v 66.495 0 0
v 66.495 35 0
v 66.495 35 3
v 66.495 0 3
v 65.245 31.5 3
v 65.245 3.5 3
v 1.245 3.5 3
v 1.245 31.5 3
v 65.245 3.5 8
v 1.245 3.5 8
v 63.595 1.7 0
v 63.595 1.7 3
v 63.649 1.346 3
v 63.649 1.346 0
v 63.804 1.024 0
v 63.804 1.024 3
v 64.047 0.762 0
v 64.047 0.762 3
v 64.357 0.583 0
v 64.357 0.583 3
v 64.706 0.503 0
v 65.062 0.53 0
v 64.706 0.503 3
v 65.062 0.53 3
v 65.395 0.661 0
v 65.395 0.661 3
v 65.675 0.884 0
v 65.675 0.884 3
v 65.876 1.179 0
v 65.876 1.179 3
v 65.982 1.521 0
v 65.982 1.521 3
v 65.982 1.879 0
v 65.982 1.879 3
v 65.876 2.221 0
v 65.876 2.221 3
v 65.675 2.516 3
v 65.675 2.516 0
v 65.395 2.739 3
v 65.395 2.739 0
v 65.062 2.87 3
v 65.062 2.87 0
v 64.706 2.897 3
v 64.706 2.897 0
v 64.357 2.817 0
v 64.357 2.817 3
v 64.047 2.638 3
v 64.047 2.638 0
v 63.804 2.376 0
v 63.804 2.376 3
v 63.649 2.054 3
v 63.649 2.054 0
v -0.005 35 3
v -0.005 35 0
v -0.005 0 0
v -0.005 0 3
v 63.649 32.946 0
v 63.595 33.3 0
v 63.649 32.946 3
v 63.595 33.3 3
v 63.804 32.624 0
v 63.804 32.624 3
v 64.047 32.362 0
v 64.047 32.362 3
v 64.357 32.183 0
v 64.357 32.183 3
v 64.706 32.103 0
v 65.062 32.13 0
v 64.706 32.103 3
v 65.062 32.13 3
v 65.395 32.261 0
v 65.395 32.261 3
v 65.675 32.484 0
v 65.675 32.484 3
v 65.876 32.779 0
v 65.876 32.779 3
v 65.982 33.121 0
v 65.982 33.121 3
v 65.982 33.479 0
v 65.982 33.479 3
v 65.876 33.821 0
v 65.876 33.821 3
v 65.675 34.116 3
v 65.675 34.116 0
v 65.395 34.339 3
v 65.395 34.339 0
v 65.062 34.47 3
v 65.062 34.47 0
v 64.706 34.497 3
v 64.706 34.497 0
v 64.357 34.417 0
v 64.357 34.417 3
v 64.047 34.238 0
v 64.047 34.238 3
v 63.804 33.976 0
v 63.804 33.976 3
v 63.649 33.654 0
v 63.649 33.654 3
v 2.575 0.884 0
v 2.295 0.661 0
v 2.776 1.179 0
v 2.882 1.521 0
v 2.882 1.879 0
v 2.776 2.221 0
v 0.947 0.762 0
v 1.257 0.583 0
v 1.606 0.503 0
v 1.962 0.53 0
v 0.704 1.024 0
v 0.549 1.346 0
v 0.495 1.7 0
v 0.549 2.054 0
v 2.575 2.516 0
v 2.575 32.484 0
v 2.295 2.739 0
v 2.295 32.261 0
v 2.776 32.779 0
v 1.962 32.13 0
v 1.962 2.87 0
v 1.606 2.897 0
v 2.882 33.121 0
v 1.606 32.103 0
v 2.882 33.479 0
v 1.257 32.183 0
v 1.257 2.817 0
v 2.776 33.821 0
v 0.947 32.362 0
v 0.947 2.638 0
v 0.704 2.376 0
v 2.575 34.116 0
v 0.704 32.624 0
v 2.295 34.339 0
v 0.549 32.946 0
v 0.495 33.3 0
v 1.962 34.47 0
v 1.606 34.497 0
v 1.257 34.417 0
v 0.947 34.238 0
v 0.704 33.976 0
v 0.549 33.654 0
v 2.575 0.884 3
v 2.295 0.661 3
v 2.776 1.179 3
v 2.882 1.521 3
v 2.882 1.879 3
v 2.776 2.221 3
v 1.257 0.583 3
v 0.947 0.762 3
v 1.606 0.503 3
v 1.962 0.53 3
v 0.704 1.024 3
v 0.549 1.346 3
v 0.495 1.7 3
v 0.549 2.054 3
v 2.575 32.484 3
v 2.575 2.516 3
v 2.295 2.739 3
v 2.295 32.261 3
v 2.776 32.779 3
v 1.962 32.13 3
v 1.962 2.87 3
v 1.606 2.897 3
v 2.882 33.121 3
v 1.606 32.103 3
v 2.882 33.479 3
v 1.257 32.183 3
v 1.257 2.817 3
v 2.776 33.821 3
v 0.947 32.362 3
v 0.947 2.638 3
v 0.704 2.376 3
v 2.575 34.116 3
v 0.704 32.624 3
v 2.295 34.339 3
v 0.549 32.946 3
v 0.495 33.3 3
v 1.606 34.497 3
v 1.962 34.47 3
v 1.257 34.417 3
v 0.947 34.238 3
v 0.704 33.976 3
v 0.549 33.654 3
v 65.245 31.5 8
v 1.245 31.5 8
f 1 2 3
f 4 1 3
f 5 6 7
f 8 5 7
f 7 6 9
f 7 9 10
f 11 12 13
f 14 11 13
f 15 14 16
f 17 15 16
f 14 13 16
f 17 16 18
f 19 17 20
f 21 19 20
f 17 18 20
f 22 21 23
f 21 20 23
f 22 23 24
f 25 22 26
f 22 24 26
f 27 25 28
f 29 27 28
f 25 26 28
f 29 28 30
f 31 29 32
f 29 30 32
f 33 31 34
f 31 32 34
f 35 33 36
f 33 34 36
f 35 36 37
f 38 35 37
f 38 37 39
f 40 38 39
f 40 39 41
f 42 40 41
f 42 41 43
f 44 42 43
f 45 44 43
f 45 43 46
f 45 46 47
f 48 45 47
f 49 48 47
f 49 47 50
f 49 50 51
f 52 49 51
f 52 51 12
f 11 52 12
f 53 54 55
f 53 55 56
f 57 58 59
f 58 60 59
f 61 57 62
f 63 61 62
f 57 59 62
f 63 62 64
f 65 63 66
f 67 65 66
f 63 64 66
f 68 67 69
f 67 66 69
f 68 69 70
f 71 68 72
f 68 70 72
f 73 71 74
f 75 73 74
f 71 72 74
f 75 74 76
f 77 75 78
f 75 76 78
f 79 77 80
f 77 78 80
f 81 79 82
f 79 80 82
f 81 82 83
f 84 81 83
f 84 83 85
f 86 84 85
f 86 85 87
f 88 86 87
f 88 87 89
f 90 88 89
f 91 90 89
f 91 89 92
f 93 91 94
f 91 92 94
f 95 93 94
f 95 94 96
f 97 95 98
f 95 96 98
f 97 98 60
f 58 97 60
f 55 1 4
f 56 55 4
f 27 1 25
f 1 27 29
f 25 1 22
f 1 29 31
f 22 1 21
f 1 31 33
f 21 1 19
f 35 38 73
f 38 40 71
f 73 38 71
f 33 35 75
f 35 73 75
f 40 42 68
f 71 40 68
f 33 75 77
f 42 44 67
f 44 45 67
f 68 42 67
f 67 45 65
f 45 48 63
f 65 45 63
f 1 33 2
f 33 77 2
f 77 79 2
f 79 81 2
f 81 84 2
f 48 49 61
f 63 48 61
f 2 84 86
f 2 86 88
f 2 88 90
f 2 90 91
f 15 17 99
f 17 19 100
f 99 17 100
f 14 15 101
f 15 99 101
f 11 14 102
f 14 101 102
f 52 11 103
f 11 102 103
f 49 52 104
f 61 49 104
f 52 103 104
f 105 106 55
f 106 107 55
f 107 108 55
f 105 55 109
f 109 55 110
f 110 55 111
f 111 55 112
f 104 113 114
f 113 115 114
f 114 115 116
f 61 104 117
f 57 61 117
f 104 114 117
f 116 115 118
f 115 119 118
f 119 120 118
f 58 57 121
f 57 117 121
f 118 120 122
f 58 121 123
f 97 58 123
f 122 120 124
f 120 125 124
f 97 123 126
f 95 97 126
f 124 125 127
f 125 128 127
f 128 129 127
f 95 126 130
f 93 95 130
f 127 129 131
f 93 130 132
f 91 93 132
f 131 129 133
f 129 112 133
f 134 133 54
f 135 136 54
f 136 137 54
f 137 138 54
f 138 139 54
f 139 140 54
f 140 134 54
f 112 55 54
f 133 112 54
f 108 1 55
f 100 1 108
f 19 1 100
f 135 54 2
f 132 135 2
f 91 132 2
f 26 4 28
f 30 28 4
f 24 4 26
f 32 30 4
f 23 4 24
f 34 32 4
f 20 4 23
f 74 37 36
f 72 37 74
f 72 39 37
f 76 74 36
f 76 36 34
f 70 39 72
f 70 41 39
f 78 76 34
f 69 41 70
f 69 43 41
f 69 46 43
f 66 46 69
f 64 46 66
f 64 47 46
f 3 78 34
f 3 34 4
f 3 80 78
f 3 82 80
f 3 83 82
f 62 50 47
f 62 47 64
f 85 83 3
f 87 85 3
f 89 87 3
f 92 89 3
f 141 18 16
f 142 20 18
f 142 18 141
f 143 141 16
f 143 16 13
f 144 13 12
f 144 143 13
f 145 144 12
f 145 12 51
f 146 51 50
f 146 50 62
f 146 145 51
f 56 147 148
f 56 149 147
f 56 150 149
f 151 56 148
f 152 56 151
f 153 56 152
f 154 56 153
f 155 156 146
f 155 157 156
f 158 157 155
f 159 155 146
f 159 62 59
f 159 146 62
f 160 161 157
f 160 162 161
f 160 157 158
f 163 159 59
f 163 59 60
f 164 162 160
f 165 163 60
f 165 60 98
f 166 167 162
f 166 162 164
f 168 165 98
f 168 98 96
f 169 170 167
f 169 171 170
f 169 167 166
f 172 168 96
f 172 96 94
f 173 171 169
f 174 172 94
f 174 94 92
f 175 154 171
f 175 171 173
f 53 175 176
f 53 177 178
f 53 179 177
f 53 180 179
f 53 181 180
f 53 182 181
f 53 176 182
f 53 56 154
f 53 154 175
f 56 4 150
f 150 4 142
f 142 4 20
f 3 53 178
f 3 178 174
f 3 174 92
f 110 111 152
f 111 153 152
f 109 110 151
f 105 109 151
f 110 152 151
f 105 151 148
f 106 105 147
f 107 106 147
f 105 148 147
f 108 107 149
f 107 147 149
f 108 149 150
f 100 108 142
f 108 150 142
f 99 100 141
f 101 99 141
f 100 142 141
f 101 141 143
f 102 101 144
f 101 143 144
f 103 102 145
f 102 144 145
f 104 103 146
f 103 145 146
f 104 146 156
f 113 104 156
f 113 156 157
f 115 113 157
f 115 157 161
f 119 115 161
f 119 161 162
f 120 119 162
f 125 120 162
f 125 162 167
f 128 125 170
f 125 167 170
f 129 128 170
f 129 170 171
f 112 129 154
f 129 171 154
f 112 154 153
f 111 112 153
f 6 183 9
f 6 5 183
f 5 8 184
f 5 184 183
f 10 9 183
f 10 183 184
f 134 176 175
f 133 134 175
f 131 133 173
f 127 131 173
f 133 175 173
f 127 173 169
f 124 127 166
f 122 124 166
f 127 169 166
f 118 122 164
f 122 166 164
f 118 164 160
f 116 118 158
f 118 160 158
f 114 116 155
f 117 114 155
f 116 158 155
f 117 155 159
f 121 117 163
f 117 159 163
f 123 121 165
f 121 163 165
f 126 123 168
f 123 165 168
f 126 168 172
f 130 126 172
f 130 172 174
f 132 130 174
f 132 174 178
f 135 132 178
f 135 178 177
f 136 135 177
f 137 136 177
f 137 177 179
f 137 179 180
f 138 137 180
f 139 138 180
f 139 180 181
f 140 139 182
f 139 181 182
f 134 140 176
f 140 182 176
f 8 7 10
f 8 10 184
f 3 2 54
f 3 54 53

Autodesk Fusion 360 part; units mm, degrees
box "BoxPrimitive1" add length 35 width 66.5 height 3 placed x (0, 1, 0) y (-1, 0, 0) z (0, 0, 1) at (66.4952, 0, 0) makes body 1
sketch "Sketch3" plane through (0, 0, 3) normal (0, 0, 1) x (-1, 0, 0)
  line L0 (-66.4952, -35) -> (0.0048, -35)
  line L1 (0.0048, -35) -> (0.0048, 0)
  line L2 (0.0048, 0) -> (-66.4952, 0)
  line L3 (-66.4952, 0) -> (-66.4952, -35)
  line L4 (0.0048, 0) -> (-66.4952, -35) construction
  line L5 (0.0048, -35) -> (-66.4952, 0) construction
  circle A0 centre (-1.6952, -33.3) radius 1.2
  line L6 (-33.2452, -17.5) -> (0.0048, -17.5) construction
  line L7 (-33.2452, -17.5) -> (-33.2452, -35) construction
  circle A1 centre (-1.6952, -1.7) radius 1.2
  circle A2 centre (-64.7952, -33.3) radius 1.2
  circle A3 centre (-64.7952, -1.7) radius 1.2
  line L8 (-65.2452, -3.5) -> (-1.2452, -3.5)
  line L9 (-1.2452, -3.5) -> (-1.2452, -31.5)
  line L10 (-1.2452, -31.5) -> (-65.2452, -31.5)
  line L11 (-65.2452, -31.5) -> (-65.2452, -3.5)
  line L12 (-65.2452, -3.5) -> (-1.2452, -31.5) construction
  line L13 (-1.2452, -3.5) -> (-65.2452, -31.5) construction
  point P0 (-33.2452, -17.5)
  dimension "d6" = 2.4
  dimension "d7" = 1.7
  dimension "d8" = 1.7
  dimension "d13" = 64
  dimension "d14" = 28
extrude "Extrude1" cut sketch "Sketch3" against normal through all contours A0 | A1 | A2 | A3 bodies 1
extrude "Extrude2" add sketch "Sketch3" along normal blind 5 separate body contours L8 L9 L10 L11 makes body 2
